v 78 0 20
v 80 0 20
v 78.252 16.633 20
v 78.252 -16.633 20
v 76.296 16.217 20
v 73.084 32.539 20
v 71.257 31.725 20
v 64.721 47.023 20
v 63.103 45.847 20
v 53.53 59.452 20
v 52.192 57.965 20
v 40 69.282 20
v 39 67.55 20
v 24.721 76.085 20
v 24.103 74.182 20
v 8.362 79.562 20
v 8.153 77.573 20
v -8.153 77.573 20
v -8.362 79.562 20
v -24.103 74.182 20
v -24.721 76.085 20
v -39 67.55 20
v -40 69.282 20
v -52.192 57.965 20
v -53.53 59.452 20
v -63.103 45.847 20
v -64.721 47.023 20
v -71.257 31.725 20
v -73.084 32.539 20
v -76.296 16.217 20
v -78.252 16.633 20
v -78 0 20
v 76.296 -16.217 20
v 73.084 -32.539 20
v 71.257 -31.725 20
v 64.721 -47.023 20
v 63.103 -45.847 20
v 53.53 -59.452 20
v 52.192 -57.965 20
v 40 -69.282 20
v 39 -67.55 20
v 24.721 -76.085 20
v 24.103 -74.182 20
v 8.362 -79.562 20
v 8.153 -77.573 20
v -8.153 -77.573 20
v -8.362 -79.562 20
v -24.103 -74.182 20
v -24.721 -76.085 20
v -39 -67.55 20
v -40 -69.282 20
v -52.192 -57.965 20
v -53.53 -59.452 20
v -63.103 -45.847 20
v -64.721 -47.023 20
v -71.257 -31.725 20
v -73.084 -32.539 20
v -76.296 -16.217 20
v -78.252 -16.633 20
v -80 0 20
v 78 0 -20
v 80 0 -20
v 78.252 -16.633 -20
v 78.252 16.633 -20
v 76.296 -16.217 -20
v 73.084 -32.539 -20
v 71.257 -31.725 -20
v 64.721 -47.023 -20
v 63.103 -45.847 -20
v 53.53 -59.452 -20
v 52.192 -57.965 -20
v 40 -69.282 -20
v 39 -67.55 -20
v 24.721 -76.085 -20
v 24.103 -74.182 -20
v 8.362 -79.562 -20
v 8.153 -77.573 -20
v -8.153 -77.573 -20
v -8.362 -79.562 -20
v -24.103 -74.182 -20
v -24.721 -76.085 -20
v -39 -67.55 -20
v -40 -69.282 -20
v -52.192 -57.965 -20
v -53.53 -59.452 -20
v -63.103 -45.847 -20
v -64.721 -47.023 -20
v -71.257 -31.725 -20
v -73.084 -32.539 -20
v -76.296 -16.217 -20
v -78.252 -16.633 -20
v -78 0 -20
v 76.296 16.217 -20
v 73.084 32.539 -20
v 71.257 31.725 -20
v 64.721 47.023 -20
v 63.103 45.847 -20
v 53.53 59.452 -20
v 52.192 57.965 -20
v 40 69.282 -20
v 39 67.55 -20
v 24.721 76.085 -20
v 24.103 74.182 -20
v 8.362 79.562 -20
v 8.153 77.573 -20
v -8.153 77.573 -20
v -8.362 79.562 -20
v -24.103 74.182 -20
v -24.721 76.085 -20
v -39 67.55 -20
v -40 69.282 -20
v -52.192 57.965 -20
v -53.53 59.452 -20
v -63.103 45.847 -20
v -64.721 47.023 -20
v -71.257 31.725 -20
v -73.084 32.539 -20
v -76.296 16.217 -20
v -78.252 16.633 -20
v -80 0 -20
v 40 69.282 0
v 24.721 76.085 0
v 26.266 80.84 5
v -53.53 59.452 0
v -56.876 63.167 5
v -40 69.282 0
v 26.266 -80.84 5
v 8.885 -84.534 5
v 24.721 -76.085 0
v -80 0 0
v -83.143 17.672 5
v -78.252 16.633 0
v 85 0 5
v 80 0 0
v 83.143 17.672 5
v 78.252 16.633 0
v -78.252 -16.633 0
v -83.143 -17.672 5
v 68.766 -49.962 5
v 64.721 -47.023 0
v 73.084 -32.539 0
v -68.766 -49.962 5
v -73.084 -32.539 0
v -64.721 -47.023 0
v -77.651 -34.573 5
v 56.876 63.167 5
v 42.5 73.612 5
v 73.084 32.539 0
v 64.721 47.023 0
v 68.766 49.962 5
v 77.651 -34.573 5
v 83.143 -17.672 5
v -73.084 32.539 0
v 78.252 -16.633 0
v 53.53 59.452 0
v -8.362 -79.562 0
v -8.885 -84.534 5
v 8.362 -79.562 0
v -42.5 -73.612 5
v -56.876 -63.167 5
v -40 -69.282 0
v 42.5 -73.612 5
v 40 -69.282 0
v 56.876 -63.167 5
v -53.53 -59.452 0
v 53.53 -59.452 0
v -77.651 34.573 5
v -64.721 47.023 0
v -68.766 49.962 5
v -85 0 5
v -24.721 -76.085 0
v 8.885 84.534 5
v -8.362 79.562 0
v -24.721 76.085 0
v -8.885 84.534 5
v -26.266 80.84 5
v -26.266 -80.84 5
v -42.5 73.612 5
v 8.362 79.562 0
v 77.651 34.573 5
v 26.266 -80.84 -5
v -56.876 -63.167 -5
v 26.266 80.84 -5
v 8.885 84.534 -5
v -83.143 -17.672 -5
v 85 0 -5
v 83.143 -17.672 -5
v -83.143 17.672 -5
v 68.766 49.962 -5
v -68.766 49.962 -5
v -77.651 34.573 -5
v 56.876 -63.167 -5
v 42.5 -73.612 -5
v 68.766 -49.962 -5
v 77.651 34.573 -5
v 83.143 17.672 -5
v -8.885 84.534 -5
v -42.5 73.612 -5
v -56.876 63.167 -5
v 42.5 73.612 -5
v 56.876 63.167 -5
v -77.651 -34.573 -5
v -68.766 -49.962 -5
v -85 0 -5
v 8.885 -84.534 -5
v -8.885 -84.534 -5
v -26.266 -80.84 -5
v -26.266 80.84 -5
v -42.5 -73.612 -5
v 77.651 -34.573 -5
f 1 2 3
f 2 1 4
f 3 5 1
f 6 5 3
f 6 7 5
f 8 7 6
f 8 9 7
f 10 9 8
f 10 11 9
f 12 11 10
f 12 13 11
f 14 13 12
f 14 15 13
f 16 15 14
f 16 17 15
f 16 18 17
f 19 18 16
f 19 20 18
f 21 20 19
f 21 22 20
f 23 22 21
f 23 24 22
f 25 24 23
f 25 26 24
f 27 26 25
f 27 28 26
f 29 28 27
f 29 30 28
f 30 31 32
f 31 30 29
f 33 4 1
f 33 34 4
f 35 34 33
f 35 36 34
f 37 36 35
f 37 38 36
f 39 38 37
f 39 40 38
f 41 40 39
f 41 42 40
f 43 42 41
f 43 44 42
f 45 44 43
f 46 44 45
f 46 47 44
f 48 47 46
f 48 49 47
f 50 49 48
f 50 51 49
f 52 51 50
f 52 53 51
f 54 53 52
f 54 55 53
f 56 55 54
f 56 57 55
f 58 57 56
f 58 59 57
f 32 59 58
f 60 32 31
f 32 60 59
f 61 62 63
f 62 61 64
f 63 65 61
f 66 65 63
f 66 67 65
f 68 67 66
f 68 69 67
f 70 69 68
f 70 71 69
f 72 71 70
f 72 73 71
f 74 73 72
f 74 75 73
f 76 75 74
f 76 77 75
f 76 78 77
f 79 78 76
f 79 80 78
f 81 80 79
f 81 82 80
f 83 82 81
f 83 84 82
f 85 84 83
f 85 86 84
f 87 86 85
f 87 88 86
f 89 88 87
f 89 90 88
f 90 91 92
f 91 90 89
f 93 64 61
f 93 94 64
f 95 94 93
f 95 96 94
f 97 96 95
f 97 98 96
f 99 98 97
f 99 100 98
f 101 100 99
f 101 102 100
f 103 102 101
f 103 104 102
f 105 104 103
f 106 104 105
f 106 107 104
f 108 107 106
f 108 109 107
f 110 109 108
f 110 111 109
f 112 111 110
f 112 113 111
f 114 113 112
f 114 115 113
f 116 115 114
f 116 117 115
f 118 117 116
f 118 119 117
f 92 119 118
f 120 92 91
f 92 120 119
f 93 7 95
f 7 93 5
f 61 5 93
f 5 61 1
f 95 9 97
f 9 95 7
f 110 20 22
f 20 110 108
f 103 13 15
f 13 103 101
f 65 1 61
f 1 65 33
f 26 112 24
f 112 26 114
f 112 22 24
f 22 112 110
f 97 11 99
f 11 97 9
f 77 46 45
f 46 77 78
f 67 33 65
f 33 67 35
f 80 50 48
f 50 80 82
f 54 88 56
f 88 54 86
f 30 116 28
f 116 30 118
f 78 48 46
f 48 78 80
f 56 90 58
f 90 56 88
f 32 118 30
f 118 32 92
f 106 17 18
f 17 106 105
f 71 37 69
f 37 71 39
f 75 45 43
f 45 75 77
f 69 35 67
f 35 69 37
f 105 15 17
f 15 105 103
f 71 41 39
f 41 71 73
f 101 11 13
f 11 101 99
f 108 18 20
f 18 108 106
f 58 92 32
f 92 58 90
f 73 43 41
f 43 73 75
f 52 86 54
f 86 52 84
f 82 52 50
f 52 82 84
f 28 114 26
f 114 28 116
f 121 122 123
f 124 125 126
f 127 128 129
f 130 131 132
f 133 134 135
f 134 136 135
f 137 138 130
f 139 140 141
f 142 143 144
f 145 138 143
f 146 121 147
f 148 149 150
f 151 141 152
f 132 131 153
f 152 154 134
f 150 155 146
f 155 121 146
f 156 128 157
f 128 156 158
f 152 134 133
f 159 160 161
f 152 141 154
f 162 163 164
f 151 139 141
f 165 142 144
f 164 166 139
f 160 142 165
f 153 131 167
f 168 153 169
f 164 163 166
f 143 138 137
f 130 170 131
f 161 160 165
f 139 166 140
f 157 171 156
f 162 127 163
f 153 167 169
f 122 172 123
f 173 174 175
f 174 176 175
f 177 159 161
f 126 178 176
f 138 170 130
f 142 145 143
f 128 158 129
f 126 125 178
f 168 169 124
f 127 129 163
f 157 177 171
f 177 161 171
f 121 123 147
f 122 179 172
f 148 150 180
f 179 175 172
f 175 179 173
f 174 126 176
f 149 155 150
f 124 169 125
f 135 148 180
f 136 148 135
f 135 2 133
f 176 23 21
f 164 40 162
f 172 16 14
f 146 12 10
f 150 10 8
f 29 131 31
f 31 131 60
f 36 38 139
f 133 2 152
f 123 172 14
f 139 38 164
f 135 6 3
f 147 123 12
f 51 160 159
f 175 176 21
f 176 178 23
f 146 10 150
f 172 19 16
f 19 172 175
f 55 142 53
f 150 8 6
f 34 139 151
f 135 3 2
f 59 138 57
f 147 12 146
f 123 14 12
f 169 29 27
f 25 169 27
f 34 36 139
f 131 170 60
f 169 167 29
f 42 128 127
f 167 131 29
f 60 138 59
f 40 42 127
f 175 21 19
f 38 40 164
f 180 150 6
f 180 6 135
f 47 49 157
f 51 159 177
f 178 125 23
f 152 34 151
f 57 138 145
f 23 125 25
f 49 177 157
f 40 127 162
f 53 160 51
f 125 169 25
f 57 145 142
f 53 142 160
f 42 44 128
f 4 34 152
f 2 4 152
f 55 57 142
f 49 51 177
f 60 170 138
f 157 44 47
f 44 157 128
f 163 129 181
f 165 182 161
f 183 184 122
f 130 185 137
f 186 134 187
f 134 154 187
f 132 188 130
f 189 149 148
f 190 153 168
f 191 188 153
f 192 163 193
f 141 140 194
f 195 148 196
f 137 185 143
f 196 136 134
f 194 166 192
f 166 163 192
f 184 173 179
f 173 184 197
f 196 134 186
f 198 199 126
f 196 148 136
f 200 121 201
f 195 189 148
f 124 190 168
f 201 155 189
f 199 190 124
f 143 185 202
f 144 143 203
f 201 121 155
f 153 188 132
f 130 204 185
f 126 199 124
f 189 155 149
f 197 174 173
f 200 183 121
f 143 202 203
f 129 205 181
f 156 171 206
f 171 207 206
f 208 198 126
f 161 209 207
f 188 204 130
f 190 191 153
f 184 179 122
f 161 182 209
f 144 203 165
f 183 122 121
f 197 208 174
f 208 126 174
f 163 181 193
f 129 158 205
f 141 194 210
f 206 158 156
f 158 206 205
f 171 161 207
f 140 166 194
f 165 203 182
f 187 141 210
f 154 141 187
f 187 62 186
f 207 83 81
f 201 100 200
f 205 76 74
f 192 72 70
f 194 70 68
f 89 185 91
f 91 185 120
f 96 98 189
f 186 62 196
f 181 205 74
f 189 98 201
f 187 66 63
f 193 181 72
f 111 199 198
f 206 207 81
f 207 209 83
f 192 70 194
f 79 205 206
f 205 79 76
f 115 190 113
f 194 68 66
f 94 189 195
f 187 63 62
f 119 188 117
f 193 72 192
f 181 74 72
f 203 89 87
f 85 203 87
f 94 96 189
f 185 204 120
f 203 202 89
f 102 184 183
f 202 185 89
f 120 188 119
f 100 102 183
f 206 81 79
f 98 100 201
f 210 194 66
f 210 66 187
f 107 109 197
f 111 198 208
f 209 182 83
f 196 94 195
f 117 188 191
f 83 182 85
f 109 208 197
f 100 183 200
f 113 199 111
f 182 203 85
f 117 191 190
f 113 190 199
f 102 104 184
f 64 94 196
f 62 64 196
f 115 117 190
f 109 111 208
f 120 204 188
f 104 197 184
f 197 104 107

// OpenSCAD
// file: ring.scad
//ring( 15,10,5,true);

module ring(r1, r2, h, center = false) {
    difference() {
        cylinder(r = r1, h = h, center = center);
        translate([ 0, 0, -1 ]) cylinder(r = r2, h = h+2, center = center);
    }
}
// main file
use <ring.scad>;

snap_ring(80,40,2);

module snap_tab( base, width, height){
    difference() {
        union() {
            cylinder( r1 =base, r2 = base+width, h = height);
            translate( [0,0,height] )cylinder( r1 =base+width, r2 = base, h = 3*height);
        }
        cylinder( r =base, h = 5*height);
    }
}

module snap_ring( diameter, height, thick) {
    snap_width = 5;
    snap_base = diameter;
    snap_height_unit = 5;
    ring( diameter, diameter-thick, h = height, center = true );
    translate( [0,0,height/2-4*snap_height_unit] ) snap_tab( snap_base, snap_width, snap_height_unit);

    rotate([180,0,0]) translate( [0,0,height/2-4*snap_height_unit] ) snap_tab( snap_base, snap_width, snap_height_unit);
}
